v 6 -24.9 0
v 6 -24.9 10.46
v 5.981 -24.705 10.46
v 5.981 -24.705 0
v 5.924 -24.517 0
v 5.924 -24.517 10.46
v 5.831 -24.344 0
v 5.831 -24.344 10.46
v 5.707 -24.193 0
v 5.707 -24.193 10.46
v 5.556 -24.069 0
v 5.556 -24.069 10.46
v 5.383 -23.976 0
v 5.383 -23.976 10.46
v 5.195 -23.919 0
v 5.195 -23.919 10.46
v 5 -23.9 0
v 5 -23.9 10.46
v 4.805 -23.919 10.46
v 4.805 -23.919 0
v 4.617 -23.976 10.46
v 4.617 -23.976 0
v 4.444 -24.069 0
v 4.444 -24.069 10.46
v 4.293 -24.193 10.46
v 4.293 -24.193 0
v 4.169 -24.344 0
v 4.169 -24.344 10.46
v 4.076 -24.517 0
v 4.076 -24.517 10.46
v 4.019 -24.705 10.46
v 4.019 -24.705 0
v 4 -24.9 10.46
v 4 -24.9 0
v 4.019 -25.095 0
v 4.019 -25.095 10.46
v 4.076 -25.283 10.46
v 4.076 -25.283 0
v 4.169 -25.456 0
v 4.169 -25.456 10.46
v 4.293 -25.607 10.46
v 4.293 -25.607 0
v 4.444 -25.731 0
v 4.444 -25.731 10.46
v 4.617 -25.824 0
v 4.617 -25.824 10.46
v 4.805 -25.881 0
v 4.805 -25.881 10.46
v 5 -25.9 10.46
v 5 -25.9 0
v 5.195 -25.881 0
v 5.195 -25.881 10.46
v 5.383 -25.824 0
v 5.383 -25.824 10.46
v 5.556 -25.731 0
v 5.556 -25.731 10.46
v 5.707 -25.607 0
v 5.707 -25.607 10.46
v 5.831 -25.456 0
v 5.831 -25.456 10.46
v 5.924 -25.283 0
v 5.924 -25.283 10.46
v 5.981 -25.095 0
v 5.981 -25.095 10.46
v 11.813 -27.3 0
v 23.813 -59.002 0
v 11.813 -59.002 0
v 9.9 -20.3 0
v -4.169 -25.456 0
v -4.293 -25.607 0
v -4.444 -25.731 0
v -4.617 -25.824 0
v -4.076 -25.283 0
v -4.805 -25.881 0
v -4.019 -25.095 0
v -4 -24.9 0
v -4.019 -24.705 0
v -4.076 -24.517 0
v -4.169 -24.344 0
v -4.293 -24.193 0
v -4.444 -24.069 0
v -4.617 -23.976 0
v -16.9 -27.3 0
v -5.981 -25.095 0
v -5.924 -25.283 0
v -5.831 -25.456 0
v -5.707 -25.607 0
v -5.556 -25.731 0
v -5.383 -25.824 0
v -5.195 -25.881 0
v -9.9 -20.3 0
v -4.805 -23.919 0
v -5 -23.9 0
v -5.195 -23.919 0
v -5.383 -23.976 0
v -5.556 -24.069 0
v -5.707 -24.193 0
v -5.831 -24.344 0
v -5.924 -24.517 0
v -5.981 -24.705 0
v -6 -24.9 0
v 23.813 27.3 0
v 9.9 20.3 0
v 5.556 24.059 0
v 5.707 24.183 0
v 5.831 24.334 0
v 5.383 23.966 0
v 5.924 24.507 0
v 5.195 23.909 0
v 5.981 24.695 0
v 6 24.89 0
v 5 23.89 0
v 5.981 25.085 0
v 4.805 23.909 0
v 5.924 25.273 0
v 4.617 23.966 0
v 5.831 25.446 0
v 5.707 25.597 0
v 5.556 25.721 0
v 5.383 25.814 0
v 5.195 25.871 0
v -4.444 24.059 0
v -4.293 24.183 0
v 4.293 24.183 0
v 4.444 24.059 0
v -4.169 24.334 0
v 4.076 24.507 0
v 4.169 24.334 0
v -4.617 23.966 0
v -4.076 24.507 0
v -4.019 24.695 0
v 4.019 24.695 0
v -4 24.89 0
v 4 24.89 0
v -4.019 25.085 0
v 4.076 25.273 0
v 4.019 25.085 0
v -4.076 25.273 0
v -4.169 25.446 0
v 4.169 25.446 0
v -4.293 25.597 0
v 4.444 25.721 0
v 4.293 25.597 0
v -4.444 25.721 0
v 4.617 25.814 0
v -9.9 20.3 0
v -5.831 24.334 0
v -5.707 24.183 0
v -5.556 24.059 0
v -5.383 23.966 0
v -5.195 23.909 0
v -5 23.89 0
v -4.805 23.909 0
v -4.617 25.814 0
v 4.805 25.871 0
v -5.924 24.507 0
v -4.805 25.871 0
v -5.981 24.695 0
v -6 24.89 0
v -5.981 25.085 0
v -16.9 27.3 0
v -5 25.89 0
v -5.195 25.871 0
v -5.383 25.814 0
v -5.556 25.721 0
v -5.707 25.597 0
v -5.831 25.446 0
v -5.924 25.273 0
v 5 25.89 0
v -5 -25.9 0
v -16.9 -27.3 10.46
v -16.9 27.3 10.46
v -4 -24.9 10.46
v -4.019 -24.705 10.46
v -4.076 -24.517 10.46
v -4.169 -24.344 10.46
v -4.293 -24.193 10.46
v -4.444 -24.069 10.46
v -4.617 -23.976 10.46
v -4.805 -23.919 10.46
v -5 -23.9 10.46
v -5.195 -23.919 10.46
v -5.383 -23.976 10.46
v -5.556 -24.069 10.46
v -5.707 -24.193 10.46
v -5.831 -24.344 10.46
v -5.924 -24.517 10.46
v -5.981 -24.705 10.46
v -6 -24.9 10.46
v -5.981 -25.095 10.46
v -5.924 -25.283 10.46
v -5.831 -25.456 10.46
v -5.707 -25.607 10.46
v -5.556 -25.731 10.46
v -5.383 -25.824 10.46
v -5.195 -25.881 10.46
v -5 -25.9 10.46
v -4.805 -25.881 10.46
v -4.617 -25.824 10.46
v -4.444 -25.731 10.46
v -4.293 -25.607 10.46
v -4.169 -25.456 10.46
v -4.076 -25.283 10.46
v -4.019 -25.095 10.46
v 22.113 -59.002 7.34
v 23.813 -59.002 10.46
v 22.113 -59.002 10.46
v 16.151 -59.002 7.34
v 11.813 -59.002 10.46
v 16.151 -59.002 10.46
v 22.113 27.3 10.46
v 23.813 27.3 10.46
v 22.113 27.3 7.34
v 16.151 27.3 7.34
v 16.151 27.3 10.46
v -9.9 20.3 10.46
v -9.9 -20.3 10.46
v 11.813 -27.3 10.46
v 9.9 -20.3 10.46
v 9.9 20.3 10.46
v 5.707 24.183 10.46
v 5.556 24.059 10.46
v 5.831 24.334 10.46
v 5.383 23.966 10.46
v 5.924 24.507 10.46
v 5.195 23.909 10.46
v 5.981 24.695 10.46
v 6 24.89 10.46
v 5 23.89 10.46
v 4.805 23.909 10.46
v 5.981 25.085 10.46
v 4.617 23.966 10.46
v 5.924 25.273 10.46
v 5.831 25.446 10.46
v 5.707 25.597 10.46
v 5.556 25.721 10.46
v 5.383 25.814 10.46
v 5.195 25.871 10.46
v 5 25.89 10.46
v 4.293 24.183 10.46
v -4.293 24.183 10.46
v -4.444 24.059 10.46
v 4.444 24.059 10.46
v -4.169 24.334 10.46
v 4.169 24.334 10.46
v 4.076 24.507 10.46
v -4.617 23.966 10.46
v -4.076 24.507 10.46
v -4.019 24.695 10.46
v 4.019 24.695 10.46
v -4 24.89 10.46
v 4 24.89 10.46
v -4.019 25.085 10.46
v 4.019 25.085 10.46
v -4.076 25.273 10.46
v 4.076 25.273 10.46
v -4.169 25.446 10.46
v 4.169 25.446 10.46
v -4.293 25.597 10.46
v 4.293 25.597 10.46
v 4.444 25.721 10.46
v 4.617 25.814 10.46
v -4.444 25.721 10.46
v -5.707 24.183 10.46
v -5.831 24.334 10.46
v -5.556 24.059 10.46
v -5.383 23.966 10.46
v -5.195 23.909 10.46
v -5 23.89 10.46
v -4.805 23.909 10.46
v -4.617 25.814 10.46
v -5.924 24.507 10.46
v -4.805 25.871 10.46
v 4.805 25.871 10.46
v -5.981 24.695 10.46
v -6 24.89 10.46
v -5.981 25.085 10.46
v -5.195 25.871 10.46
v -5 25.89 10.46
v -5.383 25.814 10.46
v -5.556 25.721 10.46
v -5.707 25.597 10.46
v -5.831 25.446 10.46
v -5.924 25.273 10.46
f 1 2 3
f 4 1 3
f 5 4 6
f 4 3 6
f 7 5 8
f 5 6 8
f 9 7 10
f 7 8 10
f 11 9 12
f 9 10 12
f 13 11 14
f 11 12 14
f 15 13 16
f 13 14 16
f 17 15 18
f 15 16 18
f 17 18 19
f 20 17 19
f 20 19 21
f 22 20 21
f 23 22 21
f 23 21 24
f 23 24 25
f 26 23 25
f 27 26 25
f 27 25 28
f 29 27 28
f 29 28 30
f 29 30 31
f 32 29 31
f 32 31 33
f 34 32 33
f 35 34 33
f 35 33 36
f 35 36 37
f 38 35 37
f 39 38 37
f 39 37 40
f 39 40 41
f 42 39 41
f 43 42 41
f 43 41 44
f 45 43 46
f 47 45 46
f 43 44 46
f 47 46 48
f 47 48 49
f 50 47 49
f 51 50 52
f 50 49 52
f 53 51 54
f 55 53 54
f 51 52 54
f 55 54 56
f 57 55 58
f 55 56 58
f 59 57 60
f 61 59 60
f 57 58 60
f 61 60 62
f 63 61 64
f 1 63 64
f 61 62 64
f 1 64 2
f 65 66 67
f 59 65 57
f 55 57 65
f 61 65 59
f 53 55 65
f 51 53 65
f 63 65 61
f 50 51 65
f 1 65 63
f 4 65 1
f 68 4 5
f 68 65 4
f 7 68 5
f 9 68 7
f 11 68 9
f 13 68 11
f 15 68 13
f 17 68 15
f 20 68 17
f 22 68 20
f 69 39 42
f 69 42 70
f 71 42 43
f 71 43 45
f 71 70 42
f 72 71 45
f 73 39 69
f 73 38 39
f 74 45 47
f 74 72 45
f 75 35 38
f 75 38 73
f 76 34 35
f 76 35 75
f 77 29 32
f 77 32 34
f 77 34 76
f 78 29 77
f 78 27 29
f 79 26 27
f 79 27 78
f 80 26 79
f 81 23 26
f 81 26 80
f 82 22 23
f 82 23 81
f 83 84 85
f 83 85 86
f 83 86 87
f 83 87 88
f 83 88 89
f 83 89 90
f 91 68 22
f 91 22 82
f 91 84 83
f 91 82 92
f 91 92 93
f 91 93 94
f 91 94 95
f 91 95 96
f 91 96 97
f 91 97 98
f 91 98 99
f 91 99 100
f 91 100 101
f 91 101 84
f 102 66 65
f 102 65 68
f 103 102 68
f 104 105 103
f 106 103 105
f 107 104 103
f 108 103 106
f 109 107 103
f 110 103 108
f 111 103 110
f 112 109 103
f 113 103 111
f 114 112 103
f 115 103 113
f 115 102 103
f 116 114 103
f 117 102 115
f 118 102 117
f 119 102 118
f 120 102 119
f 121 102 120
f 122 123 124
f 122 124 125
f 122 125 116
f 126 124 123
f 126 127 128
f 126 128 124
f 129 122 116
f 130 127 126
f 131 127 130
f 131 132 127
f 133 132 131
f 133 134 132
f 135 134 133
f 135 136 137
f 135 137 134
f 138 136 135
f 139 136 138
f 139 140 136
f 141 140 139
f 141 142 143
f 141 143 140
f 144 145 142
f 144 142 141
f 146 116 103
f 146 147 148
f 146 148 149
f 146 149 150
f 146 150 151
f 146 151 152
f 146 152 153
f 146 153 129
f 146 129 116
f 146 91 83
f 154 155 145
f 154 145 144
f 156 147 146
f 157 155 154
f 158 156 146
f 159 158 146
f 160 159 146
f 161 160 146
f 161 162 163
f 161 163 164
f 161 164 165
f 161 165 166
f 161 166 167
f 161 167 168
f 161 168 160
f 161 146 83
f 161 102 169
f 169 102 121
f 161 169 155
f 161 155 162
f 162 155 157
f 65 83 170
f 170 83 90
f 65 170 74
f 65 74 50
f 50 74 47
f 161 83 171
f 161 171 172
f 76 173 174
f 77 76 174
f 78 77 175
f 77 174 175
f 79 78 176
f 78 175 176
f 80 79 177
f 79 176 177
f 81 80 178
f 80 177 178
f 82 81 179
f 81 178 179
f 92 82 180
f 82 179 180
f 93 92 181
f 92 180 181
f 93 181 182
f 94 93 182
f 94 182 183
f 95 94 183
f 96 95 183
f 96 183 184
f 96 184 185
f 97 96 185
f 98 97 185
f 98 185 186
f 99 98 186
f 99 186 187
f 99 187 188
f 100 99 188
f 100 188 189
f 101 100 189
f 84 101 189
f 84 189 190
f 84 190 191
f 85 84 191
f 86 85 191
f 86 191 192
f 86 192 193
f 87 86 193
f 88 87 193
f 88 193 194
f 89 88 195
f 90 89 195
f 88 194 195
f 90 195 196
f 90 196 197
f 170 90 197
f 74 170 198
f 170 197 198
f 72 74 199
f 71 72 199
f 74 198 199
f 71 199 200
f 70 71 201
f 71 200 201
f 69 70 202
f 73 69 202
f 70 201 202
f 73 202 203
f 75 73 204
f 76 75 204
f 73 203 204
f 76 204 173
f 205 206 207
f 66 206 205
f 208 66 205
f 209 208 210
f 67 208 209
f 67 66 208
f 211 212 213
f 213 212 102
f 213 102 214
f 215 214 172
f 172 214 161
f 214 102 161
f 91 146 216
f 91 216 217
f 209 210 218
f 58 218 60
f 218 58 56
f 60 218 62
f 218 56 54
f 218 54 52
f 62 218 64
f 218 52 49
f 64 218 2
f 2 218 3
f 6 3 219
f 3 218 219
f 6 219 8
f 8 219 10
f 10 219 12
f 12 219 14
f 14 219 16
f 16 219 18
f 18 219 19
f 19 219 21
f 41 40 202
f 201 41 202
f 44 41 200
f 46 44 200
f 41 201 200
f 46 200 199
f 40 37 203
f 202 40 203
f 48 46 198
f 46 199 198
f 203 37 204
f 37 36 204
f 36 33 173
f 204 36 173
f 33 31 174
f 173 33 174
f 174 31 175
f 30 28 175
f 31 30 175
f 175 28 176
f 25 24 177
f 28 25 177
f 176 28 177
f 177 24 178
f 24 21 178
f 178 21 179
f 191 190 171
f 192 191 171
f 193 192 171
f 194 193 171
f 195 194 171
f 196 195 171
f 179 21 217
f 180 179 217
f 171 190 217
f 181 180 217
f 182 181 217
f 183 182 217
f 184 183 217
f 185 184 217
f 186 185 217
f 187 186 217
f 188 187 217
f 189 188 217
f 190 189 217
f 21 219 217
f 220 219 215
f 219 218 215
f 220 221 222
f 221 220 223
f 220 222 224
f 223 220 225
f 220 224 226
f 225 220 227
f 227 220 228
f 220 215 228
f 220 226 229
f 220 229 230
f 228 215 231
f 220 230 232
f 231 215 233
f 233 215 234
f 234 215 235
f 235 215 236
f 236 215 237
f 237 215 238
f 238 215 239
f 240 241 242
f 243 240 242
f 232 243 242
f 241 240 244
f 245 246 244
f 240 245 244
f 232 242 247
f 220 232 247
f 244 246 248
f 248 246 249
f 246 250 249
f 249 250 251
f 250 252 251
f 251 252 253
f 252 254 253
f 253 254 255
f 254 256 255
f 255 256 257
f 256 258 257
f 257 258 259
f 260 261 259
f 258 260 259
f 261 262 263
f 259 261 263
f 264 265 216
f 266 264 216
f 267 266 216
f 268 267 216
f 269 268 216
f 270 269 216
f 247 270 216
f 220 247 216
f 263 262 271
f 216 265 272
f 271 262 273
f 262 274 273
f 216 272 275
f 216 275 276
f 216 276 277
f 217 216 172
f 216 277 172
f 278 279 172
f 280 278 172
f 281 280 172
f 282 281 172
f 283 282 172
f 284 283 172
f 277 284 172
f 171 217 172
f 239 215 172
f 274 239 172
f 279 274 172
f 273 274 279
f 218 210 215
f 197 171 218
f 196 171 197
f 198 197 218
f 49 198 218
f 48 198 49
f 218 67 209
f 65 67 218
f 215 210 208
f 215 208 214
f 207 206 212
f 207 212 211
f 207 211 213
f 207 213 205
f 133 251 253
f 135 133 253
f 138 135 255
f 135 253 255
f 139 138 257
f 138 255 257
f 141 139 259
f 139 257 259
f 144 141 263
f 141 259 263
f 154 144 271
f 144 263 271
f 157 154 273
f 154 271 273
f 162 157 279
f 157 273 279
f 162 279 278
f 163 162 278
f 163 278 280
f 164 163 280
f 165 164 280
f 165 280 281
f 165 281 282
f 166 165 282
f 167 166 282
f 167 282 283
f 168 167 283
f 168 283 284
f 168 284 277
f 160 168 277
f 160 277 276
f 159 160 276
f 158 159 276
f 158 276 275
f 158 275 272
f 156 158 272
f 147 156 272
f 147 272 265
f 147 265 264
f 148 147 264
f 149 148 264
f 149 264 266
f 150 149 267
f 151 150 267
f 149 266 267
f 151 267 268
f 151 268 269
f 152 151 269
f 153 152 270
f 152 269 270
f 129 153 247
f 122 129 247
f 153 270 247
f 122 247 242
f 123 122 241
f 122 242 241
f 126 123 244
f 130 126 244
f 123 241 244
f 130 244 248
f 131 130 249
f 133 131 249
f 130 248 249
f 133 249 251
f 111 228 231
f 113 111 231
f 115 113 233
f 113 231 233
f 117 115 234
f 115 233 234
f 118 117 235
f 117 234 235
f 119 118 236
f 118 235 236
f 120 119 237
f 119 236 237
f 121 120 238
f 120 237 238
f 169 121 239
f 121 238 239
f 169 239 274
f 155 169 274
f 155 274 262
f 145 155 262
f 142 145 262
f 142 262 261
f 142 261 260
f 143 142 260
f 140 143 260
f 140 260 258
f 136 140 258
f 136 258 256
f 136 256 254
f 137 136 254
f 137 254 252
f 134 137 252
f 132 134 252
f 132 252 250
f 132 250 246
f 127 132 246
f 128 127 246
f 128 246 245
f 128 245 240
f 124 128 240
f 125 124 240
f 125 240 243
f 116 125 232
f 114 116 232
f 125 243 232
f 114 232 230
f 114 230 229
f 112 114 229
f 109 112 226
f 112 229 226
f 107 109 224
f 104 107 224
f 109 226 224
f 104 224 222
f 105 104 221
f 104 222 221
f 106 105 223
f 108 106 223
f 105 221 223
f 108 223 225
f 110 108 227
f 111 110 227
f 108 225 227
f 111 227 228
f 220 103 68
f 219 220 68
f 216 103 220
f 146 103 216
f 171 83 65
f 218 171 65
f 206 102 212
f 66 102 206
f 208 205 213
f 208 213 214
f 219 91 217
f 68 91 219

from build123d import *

# Parameters (mm, degrees)
BOSS_EXTRUDE2_DEPTH = 10.46
CUT_EXTRUDE1_DEPTH  = 3.12
SKETCH5_R           = 1
CUT_EXTRUDE2_DEPTH  = 20


with BuildPart() as part:
    # Sketch2 → Boss-Extrude2 (new body)
    with BuildSketch(Plane.XY):
        Polygon((-7.9, 27.3), (23.813102619, 27.3), (23.813102619, -59.002149985), (11.813102619, -59.002149985), (11.813102619, -27.3), (-2.175, -27.3), (-16.9, -27.3), (-16.9, 27.3), align=None)
        Polygon((-9.9, -20.3), (9.9, -20.3), (9.9, -19.3), (9.9, 20.3), (-9.9, 20.3), align=None, mode=Mode.SUBTRACT)
    extrude(amount=BOSS_EXTRUDE2_DEPTH)

    # Sketch4 → Cut-Extrude1 (cut)
    with BuildSketch(Plane.XY.offset(10.46)):
        Polygon((17.813102619, -59.002149985), (17.2, -59.002149985), (16.150910181, -59.002149985), (16.150910181, 27.3), (17.2, 27.3), (22.113102619, 27.3), (22.113102619, -59.002149985), align=None)
    extrude(amount=-CUT_EXTRUDE1_DEPTH, mode=Mode.SUBTRACT)

    # Sketch5 → Cut-Extrude2 (cut)
    with BuildSketch(Plane.XY.offset(10.46)):
        with Locations((-5, -24.9)):
            Circle(SKETCH5_R)
        with Locations((5, -24.9)):
            Circle(SKETCH5_R)
        with Locations((-5, 24.89)):
            Circle(SKETCH5_R)
        with Locations((5, 24.89)):
            Circle(SKETCH5_R)
    extrude(amount=-CUT_EXTRUDE2_DEPTH, mode=Mode.SUBTRACT)


solid = part.part
